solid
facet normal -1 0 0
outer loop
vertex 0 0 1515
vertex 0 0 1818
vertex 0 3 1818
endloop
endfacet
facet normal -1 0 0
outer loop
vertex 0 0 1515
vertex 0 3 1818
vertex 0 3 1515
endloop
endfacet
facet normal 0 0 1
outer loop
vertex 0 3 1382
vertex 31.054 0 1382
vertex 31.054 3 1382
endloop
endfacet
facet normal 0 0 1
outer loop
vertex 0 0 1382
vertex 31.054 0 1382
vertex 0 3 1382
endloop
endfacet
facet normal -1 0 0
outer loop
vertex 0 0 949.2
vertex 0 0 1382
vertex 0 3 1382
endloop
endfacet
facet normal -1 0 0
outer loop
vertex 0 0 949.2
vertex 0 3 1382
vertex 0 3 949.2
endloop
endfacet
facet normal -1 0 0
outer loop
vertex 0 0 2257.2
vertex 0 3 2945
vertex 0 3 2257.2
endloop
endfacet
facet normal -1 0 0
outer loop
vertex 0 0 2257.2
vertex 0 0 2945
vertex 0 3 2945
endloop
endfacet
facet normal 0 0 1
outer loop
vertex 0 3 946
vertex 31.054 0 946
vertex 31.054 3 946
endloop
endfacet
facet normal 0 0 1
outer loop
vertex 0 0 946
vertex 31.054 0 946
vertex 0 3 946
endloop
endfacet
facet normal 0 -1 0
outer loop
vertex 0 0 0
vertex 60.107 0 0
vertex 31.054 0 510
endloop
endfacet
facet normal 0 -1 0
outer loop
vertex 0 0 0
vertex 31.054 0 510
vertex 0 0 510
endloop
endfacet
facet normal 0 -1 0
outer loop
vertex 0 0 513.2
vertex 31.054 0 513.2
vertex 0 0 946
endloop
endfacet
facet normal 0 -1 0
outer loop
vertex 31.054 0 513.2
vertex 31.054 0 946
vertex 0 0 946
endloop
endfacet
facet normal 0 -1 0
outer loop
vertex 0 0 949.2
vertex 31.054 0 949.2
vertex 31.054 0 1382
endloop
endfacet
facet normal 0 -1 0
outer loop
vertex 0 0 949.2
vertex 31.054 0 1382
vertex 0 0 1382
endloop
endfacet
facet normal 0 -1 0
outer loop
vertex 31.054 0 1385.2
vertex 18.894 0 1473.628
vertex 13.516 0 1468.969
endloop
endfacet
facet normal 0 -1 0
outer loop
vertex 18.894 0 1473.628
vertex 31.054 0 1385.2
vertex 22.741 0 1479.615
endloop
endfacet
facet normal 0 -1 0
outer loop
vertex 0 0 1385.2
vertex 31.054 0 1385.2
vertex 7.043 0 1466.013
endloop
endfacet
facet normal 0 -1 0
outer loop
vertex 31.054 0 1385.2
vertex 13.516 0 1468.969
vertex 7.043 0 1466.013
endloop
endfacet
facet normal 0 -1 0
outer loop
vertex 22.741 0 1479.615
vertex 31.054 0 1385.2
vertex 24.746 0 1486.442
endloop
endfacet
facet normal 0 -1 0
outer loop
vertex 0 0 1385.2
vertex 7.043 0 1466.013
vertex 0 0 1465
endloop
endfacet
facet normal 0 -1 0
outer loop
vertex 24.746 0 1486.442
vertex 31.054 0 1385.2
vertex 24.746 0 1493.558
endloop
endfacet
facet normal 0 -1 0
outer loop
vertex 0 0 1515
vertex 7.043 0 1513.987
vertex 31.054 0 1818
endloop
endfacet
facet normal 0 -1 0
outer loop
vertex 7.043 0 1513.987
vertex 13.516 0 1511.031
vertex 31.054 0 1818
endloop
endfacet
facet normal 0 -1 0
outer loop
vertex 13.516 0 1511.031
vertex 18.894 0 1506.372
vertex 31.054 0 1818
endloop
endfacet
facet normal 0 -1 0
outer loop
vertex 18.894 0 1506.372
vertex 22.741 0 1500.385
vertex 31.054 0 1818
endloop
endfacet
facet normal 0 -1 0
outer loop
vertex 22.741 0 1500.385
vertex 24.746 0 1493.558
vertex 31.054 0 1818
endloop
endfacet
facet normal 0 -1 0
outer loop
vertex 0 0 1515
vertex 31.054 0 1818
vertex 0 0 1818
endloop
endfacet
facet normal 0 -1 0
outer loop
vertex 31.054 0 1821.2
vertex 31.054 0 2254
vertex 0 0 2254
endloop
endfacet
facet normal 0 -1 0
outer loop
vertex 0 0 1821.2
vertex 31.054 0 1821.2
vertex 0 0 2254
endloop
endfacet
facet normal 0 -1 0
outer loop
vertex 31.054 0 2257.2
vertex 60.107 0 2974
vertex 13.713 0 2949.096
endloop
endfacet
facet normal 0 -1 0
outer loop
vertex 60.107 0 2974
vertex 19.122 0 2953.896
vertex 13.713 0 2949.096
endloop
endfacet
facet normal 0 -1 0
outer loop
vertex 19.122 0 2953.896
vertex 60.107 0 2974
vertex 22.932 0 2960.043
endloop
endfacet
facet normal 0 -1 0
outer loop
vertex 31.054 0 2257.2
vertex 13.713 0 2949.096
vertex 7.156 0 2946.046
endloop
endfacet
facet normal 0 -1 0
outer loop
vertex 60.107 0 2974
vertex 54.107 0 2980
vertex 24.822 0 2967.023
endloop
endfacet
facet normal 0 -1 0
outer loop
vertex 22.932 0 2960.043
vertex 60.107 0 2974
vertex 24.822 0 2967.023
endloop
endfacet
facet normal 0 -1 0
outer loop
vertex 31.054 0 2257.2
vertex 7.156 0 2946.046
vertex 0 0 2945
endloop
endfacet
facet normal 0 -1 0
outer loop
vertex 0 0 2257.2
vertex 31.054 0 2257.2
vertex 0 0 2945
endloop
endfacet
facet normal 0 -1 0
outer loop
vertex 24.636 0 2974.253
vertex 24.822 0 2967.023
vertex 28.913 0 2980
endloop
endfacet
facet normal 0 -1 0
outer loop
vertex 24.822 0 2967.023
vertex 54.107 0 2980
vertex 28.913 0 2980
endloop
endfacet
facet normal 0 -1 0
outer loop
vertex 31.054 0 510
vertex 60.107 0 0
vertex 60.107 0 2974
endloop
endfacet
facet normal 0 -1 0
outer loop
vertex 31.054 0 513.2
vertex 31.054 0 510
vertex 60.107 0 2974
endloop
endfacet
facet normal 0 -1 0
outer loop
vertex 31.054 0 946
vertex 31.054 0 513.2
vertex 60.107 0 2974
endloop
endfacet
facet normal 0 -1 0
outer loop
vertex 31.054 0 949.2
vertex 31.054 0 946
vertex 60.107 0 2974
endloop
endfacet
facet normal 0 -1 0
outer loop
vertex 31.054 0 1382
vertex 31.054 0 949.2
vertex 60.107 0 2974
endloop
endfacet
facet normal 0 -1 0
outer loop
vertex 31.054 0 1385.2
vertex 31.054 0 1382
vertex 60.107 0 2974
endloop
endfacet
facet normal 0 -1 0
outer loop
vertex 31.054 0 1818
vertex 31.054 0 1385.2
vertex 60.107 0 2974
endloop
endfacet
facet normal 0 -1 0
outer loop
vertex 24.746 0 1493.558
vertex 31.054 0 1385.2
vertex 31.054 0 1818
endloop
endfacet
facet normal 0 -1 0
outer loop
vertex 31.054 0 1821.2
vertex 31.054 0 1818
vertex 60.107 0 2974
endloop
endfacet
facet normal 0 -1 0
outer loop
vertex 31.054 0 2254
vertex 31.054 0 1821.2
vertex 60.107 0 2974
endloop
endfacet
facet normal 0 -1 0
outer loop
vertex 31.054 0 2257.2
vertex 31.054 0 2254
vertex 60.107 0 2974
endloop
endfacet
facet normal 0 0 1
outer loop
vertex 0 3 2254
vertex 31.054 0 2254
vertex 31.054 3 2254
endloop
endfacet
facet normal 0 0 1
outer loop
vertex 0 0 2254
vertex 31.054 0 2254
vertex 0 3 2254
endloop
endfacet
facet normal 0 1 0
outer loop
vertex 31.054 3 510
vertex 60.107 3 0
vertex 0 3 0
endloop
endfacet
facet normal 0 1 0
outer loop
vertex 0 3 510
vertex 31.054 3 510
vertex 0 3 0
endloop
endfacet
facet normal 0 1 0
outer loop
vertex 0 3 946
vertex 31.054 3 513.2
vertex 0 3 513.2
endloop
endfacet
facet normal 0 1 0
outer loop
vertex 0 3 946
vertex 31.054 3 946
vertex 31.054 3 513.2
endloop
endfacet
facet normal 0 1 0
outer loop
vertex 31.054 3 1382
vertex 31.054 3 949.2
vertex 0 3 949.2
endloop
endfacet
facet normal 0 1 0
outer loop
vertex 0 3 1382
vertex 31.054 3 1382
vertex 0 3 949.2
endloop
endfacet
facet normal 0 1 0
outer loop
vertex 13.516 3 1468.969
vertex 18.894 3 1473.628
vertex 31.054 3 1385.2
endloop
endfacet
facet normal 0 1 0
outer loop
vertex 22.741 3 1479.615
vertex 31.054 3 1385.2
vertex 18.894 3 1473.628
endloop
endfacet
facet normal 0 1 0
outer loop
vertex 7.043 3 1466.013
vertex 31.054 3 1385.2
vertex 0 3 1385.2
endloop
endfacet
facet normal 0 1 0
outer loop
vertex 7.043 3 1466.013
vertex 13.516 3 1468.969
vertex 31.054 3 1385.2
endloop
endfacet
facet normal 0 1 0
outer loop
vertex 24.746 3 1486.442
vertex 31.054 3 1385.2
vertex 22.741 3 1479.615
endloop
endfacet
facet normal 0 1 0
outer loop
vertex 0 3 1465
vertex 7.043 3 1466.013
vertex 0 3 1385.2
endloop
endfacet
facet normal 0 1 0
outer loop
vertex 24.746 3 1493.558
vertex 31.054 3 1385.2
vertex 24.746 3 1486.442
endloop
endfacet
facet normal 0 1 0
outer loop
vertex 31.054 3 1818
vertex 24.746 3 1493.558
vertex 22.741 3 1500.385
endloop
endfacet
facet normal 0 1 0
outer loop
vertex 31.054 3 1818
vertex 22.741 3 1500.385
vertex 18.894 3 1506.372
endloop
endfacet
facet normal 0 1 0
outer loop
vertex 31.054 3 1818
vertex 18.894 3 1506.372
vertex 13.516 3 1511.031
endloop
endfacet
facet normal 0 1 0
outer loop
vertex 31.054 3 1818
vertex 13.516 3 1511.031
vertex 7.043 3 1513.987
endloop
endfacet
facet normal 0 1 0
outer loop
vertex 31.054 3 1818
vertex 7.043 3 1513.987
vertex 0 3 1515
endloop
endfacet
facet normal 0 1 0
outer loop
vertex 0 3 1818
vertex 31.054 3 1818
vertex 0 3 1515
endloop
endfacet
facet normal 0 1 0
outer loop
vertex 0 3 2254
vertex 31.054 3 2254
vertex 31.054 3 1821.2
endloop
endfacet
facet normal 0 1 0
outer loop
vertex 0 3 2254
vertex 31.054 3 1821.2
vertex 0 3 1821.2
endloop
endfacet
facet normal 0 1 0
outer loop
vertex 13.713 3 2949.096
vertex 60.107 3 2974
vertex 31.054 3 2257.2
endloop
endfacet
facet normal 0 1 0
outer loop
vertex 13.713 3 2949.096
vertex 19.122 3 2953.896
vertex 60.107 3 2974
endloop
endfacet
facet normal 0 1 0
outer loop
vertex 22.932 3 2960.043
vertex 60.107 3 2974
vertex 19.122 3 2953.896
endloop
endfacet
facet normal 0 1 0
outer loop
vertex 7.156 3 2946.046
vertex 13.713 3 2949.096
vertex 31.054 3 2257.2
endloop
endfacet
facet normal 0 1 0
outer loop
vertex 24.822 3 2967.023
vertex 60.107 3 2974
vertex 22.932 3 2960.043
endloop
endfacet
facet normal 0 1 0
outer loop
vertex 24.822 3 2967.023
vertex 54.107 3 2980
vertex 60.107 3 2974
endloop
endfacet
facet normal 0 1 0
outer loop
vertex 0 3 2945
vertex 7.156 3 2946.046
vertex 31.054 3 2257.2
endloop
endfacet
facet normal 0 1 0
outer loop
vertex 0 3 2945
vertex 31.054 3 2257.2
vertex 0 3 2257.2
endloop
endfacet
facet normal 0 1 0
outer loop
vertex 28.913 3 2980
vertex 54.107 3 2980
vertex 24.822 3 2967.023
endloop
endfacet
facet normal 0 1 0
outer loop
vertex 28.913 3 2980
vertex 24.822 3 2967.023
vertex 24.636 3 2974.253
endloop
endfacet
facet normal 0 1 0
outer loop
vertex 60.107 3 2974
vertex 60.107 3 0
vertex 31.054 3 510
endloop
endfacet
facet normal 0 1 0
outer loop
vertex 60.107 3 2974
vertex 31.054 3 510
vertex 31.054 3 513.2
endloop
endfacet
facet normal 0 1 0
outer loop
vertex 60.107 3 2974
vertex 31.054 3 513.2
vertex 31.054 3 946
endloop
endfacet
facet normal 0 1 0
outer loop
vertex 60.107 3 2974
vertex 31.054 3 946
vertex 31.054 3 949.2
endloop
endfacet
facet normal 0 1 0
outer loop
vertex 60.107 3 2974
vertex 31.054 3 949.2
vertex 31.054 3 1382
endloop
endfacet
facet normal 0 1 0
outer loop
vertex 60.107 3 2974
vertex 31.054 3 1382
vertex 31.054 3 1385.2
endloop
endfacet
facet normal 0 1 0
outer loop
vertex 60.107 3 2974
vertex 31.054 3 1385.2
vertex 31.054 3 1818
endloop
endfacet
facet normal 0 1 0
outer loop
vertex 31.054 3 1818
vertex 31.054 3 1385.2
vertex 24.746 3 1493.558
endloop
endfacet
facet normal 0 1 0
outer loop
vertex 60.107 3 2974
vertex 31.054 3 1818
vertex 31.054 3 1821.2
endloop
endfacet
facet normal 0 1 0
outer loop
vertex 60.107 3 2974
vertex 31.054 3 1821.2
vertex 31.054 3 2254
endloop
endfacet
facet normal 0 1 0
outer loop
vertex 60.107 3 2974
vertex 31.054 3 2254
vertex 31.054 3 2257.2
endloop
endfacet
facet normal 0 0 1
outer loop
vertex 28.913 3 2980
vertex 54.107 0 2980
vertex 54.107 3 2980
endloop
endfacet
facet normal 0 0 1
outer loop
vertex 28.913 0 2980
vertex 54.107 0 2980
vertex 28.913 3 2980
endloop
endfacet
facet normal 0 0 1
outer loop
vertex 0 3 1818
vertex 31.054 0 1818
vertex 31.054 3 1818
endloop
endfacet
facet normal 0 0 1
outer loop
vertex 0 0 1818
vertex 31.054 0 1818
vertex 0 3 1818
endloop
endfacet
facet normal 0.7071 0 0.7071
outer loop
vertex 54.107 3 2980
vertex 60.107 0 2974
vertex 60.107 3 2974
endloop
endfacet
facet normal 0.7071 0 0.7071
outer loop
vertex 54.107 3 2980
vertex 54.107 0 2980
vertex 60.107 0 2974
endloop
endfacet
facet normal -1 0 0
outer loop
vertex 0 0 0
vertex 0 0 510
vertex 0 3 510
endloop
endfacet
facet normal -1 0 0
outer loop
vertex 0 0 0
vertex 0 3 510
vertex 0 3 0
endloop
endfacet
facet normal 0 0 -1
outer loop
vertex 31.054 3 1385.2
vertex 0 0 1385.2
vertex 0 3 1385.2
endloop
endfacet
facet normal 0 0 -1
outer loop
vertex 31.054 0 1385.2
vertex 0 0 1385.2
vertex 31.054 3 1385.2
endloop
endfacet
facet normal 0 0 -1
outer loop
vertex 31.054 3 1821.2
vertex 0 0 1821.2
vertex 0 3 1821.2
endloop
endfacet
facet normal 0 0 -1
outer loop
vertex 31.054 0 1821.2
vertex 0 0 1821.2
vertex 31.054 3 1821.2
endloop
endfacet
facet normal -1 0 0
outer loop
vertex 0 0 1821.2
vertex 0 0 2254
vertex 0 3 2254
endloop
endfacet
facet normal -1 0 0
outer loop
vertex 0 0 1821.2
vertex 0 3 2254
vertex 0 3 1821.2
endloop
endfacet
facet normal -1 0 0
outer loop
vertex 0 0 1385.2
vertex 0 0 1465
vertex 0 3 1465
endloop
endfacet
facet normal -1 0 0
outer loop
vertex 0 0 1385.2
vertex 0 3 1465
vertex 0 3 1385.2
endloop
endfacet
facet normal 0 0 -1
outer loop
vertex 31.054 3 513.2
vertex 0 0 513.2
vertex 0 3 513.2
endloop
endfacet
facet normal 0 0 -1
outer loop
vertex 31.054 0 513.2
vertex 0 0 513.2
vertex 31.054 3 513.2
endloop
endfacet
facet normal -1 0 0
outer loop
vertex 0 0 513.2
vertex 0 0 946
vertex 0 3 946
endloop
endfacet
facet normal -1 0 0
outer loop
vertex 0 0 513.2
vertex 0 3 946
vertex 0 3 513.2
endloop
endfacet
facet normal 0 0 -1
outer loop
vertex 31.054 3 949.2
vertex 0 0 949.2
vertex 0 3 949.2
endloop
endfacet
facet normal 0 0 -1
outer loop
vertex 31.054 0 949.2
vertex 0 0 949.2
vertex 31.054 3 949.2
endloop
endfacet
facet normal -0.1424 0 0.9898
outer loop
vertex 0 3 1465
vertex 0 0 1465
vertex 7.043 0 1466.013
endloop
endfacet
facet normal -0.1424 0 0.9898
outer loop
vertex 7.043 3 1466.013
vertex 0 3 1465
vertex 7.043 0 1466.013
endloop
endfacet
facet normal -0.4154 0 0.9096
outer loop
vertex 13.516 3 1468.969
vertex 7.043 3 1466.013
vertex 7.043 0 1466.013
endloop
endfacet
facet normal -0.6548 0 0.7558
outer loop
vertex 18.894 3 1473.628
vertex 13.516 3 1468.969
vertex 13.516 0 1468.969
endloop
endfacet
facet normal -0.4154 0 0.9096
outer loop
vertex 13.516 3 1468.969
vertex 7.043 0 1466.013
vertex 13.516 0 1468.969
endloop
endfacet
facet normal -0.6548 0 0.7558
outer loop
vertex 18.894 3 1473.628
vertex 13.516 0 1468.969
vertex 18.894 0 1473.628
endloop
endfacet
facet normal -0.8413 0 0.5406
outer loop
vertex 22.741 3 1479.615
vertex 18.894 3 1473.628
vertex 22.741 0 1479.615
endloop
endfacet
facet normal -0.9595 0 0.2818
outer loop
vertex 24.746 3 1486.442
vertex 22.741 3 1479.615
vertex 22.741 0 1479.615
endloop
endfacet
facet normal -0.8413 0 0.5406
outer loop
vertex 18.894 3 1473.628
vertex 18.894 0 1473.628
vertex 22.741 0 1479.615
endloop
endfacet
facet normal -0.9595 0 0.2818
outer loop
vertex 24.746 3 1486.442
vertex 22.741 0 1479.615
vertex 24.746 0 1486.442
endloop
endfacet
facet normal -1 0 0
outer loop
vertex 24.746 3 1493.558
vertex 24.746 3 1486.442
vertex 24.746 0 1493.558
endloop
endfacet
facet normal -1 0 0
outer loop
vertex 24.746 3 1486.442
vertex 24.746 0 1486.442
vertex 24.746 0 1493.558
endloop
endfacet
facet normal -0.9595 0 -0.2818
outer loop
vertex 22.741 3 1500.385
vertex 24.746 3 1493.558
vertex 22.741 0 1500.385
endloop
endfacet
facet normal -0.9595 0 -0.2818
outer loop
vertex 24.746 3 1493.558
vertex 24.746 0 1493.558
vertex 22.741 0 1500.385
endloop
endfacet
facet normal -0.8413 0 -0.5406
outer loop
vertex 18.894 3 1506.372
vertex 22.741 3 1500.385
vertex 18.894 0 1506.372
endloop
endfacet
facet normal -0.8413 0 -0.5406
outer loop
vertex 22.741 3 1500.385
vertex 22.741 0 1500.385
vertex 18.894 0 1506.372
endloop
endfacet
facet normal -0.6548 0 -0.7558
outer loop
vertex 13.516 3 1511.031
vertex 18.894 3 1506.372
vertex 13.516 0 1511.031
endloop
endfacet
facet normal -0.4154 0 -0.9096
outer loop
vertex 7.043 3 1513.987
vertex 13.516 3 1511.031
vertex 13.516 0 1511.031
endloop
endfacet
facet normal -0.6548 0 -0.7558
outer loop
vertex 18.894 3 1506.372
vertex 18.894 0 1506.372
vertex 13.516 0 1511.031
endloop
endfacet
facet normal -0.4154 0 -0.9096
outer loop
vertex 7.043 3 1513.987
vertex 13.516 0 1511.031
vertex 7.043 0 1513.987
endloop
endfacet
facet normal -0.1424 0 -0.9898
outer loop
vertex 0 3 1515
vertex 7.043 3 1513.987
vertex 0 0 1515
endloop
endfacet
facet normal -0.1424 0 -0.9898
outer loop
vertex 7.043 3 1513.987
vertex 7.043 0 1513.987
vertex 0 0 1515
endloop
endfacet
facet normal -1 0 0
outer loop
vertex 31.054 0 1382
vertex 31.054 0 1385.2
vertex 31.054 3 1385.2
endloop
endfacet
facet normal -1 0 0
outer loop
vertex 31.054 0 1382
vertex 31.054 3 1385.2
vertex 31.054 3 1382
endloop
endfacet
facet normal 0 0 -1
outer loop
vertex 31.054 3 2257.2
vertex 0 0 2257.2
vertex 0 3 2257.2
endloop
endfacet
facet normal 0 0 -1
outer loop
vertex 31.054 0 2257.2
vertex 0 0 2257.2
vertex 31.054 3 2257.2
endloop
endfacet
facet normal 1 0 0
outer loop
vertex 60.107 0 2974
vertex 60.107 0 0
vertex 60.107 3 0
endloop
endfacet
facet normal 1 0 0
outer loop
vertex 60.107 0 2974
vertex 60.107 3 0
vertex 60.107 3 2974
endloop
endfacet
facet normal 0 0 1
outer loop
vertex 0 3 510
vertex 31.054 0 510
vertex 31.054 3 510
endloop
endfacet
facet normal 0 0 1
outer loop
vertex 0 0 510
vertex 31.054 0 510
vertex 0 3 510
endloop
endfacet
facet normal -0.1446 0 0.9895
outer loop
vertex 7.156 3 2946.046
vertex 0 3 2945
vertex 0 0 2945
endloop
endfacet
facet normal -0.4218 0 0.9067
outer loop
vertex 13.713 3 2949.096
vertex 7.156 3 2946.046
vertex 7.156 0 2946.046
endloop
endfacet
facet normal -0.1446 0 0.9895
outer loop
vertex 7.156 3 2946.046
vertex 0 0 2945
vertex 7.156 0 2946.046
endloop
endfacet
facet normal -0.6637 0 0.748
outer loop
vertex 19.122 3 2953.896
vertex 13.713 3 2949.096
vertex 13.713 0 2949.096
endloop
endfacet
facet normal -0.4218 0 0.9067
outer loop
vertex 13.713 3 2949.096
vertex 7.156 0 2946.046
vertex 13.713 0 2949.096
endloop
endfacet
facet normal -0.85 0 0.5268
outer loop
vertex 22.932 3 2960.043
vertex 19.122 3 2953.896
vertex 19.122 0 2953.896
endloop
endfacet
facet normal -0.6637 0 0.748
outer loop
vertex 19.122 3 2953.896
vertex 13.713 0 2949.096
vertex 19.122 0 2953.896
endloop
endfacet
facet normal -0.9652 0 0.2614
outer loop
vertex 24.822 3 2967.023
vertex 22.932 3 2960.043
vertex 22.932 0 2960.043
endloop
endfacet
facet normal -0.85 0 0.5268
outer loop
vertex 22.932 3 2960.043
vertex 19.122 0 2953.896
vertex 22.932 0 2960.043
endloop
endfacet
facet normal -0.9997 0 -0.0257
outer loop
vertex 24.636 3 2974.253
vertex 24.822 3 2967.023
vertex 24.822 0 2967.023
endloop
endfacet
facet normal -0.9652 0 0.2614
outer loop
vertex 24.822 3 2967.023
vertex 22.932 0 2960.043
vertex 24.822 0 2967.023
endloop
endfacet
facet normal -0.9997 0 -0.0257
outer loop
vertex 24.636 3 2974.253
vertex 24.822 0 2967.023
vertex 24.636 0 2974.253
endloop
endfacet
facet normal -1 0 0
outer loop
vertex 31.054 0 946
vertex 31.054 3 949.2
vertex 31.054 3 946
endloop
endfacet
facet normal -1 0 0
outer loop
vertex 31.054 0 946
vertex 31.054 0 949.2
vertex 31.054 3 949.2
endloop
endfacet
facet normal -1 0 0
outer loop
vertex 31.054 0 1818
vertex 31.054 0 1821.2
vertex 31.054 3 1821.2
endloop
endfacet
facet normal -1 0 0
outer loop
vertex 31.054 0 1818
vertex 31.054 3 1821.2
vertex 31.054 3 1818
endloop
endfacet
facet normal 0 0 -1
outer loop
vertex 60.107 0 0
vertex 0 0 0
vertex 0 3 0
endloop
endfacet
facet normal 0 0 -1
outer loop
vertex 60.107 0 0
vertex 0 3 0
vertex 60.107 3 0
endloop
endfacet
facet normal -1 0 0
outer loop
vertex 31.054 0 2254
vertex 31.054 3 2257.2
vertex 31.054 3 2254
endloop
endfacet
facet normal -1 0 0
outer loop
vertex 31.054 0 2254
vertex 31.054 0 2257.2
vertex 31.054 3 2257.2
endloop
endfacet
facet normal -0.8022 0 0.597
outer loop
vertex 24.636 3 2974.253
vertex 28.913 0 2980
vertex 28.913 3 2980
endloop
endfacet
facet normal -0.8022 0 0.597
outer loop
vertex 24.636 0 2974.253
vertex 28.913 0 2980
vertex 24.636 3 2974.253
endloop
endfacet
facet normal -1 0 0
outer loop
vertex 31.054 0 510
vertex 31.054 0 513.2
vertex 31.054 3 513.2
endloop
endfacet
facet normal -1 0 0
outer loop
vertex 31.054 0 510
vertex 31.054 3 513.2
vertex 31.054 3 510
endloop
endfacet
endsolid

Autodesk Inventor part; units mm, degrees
ref_plane "YZ Plane" through (0, 0, 0) normal (1, 0, 0) x (0, 1, 0)
ref_plane "XZ Plane" through (0, 0, 0) normal (0, 1, 0) x (-1, 0, 0)
ref_plane "XY Plane" through (0, 0, 0) normal (0, 0, 1) x (1, 0, 0)
sketch "Sketch6" plane through (0, 0, 0) normal (0, 1, 0) x (-1, 0, 0)
  line L0 (0, 0) -> (-60.1073, 0)
  line L1 (-60.1073, 0) -> (-60.1073, 2980)
  line L2 (-60.1073, 2980) -> (0, 2980)
  line L3 (0, 2980) -> (0, 0)
  dimension "d26" = 60.1073
  dimension "d27" = 2980
extrude "Plate4" add sketch "Sketch6" along normal blind 3
sketch "Sketch9" plane through (0, 3, 0) normal (0, 1, 0) x (1, 0, 0)
  line L0 (0, -2980) -> (0, 0) projected
  line L1 (60.1073, -2980) -> (0, -2980) projected
  line L2 (60.1073, 0) -> (60.1073, -2980) projected
  line L3 (0, 0) -> (60.1073, 0) projected
  line L4 (25, -210) -> (10, -210) construction
  line L5 (10, -210) -> (10, -10) construction
  line L6 (10, -10) -> (25, -10) construction
  line L7 (25, -10) -> (25, -210) construction
  dimension "d44" = 200
  dimension "d45" = 15
  dimension "d46" = 10
  dimension "d47" = 10
mark "Mark1"
sketch "Sketch7" plane through (0, 0, 0) normal (0, -1, 0) x (1, 0, 0)
  line L0 (0, 2980) -> (60.1073, 2980) projected
  line L1 (0, 0) -> (0, 2980) projected
  line L2 (60.1073, 0) -> (0, 0) projected
  line L3 (60.1073, 2980) -> (60.1073, 0) projected
  line L4 (0, 513.2) -> (31.0536, 513.2)
  line L5 (31.0536, 513.2) -> (31.0536, 510)
  line L6 (31.0536, 510) -> (0, 510)
  line L7 (0, 510) -> (0, 513.2)
  point P0 (0, 510)
  point P1 (0, 200)
  point P2 (46.4173, 200)
  point P3 (0, 510)
  dimension "d29" = 31.0536
  dimension "d30" = 3.2
  dimension "d31" = 510
extrude "Extrusion2" cut sketch "Sketch7" against normal through all contours L4 L5 L6 L1
pattern_linear "Rectangular Pattern1" count 5 spacing 436 along (0, 0, 1) of "Extrusion2"
sketch "Sketch8" plane through (0, 0, 0) normal (0, -1, 0) x (1, 0, 0)
  line L0 (0, 1821.2) -> (0, 2254) projected
  line L1 (0, 513.2) -> (31.0536, 513.2) projected
  line L2 (31.0536, 513.2) -> (31.0536, 510) projected
  line L3 (31.0536, 510) -> (0, 510) projected
  line L4 (0, 0) -> (0, 510) projected
  line L5 (60.1073, 0) -> (0, 0) projected
  line L6 (60.1073, 2980) -> (60.1073, 0) projected
  line L7 (0, 2980) -> (60.1073, 2980) projected
  circle A0 centre (0, 1490) radius 25
  line L8 (0, 1821.2) -> (31.0536, 1821.2) projected
  line L9 (31.0536, 1821.2) -> (31.0536, 1818) projected
  line L10 (31.0536, 1818) -> (0, 1818) projected
  line L11 (0, 1385.2) -> (0, 1818) projected
  line L12 (0, 1385.2) -> (31.0536, 1385.2) projected
  line L13 (31.0536, 1385.2) -> (31.0536, 1382) projected
  line L14 (31.0536, 1382) -> (0, 1382) projected
  line L15 (0, 949.2) -> (0, 1382) projected
  line L16 (0, 949.2) -> (31.0536, 949.2) projected
  line L17 (31.0536, 949.2) -> (31.0536, 946) projected
  line L18 (31.0536, 946) -> (0, 946) projected
  line L19 (0, 513.2) -> (0, 946) projected
  line L20 (0, 2257.2) -> (31.0536, 2257.2) projected
  line L21 (31.0536, 2257.2) -> (31.0536, 2254) projected
  line L22 (31.0536, 2254) -> (0, 2254) projected
  line L23 (0, 2257.2) -> (0, 2980) projected
  dimension "d37" = 50
  dimension "d38" = 1490
extrude "Extrusion3" cut sketch "Sketch8" against normal through all contours L11 A0 | A0 L11
pattern_linear "Rectangular Pattern2" count 2 spacing 1480 along (0, 0, 1) of "Extrusion3"
chamfer "Corner Chamfer1" distance 6 angle 45 2 edges at (22.9129, 1.5, 2980) (60.1073, 1.5, 2980)
equation "\"d26\" = Stringer4_deep"
equation "\"d28\" = Thickness"
equation "\"BendReliefWidth\" = Thickness"
equation "\"BendReliefDepth\" = 0.5 * Thickness"
equation "\"CornerReliefSize\" = 4 * Thickness"
equation "\"MinimumRemnant\" = 2 * Thickness"
equation "\"TransitionRadius\" = BendRadius"
equation "\"JacobiRadiusSize\" = BendRadius"
equation "\"GapSize\" = Thickness"
equation "\"Stringer4_deep\" = 60.107271"
equation "\"Thickness\" = 3"
equation "\"BendRadius\" = 5"
properties part number "BSH 044 stringer 4" material "09g2s"
